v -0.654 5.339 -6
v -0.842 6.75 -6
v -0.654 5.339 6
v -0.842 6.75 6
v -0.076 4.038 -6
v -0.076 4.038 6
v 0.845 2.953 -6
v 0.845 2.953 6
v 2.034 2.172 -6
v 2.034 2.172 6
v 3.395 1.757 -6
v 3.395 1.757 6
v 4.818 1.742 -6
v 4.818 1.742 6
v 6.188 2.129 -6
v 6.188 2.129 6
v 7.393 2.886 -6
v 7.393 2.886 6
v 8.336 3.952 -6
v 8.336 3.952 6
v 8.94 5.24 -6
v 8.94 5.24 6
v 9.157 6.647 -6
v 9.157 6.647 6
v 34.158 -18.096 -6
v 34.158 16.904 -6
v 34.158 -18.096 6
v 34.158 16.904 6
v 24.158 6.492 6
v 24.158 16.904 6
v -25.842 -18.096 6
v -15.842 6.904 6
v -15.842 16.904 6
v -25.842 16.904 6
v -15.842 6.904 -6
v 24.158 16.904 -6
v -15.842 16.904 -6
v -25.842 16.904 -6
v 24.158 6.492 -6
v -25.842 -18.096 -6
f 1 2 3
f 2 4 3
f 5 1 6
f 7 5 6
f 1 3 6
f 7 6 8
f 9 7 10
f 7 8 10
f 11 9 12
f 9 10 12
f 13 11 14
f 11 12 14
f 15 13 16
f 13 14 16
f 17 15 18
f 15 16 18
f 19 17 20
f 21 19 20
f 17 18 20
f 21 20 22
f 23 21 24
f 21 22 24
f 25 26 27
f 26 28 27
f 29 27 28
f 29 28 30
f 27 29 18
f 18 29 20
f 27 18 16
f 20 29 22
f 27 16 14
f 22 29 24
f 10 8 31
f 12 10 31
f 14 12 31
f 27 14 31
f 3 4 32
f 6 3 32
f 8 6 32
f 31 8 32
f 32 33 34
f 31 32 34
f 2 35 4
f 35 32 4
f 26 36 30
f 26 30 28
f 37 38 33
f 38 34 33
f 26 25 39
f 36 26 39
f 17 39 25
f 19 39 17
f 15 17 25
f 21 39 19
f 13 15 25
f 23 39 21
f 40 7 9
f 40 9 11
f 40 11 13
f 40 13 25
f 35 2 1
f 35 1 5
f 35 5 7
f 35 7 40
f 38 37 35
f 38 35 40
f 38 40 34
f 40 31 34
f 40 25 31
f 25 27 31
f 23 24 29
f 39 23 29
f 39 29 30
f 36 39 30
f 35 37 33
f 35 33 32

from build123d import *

# Parameters (mm, degrees)
BOSS_EXTRUDE1_DEPTH = 6


with BuildPart() as part:
    # Sketch1 → Boss-Extrude1 (new, symmetric)
    with BuildSketch(Plane.XY):
        with BuildLine():
            Line((24.157706093, 16.904121864), (34.157706093, 16.904121864))
            Line((34.157706093, 16.904121864), (34.157706093, -18.095878136))
            Line((34.157706093, -18.095878136), (-25.842293907, -18.095878136))
            Line((-25.842293907, -18.095878136), (-25.842293907, 16.904121864))
            Line((-25.842293907, 16.904121864), (-15.842293907, 16.904121864))
            Line((-15.842293907, 16.904121864), (-15.842293907, 6.904121864))
            Line((-15.842293907, 6.904121864), (-0.842028463, 6.749549236))
            ThreePointArc((-0.842028463, 6.749549236), (4.106185531, 1.698294118), (9.157440649, 6.646508112))
            Line((9.157440649, 6.646508112), (24.157706093, 6.491935484))
            Line((24.157706093, 6.491935484), (24.157706093, 11.07078853))
            Line((24.157706093, 11.07078853), (24.157706093, 16.904121864))
        make_face()
    extrude(amount=BOSS_EXTRUDE1_DEPTH, both=True)


solid = part.part
